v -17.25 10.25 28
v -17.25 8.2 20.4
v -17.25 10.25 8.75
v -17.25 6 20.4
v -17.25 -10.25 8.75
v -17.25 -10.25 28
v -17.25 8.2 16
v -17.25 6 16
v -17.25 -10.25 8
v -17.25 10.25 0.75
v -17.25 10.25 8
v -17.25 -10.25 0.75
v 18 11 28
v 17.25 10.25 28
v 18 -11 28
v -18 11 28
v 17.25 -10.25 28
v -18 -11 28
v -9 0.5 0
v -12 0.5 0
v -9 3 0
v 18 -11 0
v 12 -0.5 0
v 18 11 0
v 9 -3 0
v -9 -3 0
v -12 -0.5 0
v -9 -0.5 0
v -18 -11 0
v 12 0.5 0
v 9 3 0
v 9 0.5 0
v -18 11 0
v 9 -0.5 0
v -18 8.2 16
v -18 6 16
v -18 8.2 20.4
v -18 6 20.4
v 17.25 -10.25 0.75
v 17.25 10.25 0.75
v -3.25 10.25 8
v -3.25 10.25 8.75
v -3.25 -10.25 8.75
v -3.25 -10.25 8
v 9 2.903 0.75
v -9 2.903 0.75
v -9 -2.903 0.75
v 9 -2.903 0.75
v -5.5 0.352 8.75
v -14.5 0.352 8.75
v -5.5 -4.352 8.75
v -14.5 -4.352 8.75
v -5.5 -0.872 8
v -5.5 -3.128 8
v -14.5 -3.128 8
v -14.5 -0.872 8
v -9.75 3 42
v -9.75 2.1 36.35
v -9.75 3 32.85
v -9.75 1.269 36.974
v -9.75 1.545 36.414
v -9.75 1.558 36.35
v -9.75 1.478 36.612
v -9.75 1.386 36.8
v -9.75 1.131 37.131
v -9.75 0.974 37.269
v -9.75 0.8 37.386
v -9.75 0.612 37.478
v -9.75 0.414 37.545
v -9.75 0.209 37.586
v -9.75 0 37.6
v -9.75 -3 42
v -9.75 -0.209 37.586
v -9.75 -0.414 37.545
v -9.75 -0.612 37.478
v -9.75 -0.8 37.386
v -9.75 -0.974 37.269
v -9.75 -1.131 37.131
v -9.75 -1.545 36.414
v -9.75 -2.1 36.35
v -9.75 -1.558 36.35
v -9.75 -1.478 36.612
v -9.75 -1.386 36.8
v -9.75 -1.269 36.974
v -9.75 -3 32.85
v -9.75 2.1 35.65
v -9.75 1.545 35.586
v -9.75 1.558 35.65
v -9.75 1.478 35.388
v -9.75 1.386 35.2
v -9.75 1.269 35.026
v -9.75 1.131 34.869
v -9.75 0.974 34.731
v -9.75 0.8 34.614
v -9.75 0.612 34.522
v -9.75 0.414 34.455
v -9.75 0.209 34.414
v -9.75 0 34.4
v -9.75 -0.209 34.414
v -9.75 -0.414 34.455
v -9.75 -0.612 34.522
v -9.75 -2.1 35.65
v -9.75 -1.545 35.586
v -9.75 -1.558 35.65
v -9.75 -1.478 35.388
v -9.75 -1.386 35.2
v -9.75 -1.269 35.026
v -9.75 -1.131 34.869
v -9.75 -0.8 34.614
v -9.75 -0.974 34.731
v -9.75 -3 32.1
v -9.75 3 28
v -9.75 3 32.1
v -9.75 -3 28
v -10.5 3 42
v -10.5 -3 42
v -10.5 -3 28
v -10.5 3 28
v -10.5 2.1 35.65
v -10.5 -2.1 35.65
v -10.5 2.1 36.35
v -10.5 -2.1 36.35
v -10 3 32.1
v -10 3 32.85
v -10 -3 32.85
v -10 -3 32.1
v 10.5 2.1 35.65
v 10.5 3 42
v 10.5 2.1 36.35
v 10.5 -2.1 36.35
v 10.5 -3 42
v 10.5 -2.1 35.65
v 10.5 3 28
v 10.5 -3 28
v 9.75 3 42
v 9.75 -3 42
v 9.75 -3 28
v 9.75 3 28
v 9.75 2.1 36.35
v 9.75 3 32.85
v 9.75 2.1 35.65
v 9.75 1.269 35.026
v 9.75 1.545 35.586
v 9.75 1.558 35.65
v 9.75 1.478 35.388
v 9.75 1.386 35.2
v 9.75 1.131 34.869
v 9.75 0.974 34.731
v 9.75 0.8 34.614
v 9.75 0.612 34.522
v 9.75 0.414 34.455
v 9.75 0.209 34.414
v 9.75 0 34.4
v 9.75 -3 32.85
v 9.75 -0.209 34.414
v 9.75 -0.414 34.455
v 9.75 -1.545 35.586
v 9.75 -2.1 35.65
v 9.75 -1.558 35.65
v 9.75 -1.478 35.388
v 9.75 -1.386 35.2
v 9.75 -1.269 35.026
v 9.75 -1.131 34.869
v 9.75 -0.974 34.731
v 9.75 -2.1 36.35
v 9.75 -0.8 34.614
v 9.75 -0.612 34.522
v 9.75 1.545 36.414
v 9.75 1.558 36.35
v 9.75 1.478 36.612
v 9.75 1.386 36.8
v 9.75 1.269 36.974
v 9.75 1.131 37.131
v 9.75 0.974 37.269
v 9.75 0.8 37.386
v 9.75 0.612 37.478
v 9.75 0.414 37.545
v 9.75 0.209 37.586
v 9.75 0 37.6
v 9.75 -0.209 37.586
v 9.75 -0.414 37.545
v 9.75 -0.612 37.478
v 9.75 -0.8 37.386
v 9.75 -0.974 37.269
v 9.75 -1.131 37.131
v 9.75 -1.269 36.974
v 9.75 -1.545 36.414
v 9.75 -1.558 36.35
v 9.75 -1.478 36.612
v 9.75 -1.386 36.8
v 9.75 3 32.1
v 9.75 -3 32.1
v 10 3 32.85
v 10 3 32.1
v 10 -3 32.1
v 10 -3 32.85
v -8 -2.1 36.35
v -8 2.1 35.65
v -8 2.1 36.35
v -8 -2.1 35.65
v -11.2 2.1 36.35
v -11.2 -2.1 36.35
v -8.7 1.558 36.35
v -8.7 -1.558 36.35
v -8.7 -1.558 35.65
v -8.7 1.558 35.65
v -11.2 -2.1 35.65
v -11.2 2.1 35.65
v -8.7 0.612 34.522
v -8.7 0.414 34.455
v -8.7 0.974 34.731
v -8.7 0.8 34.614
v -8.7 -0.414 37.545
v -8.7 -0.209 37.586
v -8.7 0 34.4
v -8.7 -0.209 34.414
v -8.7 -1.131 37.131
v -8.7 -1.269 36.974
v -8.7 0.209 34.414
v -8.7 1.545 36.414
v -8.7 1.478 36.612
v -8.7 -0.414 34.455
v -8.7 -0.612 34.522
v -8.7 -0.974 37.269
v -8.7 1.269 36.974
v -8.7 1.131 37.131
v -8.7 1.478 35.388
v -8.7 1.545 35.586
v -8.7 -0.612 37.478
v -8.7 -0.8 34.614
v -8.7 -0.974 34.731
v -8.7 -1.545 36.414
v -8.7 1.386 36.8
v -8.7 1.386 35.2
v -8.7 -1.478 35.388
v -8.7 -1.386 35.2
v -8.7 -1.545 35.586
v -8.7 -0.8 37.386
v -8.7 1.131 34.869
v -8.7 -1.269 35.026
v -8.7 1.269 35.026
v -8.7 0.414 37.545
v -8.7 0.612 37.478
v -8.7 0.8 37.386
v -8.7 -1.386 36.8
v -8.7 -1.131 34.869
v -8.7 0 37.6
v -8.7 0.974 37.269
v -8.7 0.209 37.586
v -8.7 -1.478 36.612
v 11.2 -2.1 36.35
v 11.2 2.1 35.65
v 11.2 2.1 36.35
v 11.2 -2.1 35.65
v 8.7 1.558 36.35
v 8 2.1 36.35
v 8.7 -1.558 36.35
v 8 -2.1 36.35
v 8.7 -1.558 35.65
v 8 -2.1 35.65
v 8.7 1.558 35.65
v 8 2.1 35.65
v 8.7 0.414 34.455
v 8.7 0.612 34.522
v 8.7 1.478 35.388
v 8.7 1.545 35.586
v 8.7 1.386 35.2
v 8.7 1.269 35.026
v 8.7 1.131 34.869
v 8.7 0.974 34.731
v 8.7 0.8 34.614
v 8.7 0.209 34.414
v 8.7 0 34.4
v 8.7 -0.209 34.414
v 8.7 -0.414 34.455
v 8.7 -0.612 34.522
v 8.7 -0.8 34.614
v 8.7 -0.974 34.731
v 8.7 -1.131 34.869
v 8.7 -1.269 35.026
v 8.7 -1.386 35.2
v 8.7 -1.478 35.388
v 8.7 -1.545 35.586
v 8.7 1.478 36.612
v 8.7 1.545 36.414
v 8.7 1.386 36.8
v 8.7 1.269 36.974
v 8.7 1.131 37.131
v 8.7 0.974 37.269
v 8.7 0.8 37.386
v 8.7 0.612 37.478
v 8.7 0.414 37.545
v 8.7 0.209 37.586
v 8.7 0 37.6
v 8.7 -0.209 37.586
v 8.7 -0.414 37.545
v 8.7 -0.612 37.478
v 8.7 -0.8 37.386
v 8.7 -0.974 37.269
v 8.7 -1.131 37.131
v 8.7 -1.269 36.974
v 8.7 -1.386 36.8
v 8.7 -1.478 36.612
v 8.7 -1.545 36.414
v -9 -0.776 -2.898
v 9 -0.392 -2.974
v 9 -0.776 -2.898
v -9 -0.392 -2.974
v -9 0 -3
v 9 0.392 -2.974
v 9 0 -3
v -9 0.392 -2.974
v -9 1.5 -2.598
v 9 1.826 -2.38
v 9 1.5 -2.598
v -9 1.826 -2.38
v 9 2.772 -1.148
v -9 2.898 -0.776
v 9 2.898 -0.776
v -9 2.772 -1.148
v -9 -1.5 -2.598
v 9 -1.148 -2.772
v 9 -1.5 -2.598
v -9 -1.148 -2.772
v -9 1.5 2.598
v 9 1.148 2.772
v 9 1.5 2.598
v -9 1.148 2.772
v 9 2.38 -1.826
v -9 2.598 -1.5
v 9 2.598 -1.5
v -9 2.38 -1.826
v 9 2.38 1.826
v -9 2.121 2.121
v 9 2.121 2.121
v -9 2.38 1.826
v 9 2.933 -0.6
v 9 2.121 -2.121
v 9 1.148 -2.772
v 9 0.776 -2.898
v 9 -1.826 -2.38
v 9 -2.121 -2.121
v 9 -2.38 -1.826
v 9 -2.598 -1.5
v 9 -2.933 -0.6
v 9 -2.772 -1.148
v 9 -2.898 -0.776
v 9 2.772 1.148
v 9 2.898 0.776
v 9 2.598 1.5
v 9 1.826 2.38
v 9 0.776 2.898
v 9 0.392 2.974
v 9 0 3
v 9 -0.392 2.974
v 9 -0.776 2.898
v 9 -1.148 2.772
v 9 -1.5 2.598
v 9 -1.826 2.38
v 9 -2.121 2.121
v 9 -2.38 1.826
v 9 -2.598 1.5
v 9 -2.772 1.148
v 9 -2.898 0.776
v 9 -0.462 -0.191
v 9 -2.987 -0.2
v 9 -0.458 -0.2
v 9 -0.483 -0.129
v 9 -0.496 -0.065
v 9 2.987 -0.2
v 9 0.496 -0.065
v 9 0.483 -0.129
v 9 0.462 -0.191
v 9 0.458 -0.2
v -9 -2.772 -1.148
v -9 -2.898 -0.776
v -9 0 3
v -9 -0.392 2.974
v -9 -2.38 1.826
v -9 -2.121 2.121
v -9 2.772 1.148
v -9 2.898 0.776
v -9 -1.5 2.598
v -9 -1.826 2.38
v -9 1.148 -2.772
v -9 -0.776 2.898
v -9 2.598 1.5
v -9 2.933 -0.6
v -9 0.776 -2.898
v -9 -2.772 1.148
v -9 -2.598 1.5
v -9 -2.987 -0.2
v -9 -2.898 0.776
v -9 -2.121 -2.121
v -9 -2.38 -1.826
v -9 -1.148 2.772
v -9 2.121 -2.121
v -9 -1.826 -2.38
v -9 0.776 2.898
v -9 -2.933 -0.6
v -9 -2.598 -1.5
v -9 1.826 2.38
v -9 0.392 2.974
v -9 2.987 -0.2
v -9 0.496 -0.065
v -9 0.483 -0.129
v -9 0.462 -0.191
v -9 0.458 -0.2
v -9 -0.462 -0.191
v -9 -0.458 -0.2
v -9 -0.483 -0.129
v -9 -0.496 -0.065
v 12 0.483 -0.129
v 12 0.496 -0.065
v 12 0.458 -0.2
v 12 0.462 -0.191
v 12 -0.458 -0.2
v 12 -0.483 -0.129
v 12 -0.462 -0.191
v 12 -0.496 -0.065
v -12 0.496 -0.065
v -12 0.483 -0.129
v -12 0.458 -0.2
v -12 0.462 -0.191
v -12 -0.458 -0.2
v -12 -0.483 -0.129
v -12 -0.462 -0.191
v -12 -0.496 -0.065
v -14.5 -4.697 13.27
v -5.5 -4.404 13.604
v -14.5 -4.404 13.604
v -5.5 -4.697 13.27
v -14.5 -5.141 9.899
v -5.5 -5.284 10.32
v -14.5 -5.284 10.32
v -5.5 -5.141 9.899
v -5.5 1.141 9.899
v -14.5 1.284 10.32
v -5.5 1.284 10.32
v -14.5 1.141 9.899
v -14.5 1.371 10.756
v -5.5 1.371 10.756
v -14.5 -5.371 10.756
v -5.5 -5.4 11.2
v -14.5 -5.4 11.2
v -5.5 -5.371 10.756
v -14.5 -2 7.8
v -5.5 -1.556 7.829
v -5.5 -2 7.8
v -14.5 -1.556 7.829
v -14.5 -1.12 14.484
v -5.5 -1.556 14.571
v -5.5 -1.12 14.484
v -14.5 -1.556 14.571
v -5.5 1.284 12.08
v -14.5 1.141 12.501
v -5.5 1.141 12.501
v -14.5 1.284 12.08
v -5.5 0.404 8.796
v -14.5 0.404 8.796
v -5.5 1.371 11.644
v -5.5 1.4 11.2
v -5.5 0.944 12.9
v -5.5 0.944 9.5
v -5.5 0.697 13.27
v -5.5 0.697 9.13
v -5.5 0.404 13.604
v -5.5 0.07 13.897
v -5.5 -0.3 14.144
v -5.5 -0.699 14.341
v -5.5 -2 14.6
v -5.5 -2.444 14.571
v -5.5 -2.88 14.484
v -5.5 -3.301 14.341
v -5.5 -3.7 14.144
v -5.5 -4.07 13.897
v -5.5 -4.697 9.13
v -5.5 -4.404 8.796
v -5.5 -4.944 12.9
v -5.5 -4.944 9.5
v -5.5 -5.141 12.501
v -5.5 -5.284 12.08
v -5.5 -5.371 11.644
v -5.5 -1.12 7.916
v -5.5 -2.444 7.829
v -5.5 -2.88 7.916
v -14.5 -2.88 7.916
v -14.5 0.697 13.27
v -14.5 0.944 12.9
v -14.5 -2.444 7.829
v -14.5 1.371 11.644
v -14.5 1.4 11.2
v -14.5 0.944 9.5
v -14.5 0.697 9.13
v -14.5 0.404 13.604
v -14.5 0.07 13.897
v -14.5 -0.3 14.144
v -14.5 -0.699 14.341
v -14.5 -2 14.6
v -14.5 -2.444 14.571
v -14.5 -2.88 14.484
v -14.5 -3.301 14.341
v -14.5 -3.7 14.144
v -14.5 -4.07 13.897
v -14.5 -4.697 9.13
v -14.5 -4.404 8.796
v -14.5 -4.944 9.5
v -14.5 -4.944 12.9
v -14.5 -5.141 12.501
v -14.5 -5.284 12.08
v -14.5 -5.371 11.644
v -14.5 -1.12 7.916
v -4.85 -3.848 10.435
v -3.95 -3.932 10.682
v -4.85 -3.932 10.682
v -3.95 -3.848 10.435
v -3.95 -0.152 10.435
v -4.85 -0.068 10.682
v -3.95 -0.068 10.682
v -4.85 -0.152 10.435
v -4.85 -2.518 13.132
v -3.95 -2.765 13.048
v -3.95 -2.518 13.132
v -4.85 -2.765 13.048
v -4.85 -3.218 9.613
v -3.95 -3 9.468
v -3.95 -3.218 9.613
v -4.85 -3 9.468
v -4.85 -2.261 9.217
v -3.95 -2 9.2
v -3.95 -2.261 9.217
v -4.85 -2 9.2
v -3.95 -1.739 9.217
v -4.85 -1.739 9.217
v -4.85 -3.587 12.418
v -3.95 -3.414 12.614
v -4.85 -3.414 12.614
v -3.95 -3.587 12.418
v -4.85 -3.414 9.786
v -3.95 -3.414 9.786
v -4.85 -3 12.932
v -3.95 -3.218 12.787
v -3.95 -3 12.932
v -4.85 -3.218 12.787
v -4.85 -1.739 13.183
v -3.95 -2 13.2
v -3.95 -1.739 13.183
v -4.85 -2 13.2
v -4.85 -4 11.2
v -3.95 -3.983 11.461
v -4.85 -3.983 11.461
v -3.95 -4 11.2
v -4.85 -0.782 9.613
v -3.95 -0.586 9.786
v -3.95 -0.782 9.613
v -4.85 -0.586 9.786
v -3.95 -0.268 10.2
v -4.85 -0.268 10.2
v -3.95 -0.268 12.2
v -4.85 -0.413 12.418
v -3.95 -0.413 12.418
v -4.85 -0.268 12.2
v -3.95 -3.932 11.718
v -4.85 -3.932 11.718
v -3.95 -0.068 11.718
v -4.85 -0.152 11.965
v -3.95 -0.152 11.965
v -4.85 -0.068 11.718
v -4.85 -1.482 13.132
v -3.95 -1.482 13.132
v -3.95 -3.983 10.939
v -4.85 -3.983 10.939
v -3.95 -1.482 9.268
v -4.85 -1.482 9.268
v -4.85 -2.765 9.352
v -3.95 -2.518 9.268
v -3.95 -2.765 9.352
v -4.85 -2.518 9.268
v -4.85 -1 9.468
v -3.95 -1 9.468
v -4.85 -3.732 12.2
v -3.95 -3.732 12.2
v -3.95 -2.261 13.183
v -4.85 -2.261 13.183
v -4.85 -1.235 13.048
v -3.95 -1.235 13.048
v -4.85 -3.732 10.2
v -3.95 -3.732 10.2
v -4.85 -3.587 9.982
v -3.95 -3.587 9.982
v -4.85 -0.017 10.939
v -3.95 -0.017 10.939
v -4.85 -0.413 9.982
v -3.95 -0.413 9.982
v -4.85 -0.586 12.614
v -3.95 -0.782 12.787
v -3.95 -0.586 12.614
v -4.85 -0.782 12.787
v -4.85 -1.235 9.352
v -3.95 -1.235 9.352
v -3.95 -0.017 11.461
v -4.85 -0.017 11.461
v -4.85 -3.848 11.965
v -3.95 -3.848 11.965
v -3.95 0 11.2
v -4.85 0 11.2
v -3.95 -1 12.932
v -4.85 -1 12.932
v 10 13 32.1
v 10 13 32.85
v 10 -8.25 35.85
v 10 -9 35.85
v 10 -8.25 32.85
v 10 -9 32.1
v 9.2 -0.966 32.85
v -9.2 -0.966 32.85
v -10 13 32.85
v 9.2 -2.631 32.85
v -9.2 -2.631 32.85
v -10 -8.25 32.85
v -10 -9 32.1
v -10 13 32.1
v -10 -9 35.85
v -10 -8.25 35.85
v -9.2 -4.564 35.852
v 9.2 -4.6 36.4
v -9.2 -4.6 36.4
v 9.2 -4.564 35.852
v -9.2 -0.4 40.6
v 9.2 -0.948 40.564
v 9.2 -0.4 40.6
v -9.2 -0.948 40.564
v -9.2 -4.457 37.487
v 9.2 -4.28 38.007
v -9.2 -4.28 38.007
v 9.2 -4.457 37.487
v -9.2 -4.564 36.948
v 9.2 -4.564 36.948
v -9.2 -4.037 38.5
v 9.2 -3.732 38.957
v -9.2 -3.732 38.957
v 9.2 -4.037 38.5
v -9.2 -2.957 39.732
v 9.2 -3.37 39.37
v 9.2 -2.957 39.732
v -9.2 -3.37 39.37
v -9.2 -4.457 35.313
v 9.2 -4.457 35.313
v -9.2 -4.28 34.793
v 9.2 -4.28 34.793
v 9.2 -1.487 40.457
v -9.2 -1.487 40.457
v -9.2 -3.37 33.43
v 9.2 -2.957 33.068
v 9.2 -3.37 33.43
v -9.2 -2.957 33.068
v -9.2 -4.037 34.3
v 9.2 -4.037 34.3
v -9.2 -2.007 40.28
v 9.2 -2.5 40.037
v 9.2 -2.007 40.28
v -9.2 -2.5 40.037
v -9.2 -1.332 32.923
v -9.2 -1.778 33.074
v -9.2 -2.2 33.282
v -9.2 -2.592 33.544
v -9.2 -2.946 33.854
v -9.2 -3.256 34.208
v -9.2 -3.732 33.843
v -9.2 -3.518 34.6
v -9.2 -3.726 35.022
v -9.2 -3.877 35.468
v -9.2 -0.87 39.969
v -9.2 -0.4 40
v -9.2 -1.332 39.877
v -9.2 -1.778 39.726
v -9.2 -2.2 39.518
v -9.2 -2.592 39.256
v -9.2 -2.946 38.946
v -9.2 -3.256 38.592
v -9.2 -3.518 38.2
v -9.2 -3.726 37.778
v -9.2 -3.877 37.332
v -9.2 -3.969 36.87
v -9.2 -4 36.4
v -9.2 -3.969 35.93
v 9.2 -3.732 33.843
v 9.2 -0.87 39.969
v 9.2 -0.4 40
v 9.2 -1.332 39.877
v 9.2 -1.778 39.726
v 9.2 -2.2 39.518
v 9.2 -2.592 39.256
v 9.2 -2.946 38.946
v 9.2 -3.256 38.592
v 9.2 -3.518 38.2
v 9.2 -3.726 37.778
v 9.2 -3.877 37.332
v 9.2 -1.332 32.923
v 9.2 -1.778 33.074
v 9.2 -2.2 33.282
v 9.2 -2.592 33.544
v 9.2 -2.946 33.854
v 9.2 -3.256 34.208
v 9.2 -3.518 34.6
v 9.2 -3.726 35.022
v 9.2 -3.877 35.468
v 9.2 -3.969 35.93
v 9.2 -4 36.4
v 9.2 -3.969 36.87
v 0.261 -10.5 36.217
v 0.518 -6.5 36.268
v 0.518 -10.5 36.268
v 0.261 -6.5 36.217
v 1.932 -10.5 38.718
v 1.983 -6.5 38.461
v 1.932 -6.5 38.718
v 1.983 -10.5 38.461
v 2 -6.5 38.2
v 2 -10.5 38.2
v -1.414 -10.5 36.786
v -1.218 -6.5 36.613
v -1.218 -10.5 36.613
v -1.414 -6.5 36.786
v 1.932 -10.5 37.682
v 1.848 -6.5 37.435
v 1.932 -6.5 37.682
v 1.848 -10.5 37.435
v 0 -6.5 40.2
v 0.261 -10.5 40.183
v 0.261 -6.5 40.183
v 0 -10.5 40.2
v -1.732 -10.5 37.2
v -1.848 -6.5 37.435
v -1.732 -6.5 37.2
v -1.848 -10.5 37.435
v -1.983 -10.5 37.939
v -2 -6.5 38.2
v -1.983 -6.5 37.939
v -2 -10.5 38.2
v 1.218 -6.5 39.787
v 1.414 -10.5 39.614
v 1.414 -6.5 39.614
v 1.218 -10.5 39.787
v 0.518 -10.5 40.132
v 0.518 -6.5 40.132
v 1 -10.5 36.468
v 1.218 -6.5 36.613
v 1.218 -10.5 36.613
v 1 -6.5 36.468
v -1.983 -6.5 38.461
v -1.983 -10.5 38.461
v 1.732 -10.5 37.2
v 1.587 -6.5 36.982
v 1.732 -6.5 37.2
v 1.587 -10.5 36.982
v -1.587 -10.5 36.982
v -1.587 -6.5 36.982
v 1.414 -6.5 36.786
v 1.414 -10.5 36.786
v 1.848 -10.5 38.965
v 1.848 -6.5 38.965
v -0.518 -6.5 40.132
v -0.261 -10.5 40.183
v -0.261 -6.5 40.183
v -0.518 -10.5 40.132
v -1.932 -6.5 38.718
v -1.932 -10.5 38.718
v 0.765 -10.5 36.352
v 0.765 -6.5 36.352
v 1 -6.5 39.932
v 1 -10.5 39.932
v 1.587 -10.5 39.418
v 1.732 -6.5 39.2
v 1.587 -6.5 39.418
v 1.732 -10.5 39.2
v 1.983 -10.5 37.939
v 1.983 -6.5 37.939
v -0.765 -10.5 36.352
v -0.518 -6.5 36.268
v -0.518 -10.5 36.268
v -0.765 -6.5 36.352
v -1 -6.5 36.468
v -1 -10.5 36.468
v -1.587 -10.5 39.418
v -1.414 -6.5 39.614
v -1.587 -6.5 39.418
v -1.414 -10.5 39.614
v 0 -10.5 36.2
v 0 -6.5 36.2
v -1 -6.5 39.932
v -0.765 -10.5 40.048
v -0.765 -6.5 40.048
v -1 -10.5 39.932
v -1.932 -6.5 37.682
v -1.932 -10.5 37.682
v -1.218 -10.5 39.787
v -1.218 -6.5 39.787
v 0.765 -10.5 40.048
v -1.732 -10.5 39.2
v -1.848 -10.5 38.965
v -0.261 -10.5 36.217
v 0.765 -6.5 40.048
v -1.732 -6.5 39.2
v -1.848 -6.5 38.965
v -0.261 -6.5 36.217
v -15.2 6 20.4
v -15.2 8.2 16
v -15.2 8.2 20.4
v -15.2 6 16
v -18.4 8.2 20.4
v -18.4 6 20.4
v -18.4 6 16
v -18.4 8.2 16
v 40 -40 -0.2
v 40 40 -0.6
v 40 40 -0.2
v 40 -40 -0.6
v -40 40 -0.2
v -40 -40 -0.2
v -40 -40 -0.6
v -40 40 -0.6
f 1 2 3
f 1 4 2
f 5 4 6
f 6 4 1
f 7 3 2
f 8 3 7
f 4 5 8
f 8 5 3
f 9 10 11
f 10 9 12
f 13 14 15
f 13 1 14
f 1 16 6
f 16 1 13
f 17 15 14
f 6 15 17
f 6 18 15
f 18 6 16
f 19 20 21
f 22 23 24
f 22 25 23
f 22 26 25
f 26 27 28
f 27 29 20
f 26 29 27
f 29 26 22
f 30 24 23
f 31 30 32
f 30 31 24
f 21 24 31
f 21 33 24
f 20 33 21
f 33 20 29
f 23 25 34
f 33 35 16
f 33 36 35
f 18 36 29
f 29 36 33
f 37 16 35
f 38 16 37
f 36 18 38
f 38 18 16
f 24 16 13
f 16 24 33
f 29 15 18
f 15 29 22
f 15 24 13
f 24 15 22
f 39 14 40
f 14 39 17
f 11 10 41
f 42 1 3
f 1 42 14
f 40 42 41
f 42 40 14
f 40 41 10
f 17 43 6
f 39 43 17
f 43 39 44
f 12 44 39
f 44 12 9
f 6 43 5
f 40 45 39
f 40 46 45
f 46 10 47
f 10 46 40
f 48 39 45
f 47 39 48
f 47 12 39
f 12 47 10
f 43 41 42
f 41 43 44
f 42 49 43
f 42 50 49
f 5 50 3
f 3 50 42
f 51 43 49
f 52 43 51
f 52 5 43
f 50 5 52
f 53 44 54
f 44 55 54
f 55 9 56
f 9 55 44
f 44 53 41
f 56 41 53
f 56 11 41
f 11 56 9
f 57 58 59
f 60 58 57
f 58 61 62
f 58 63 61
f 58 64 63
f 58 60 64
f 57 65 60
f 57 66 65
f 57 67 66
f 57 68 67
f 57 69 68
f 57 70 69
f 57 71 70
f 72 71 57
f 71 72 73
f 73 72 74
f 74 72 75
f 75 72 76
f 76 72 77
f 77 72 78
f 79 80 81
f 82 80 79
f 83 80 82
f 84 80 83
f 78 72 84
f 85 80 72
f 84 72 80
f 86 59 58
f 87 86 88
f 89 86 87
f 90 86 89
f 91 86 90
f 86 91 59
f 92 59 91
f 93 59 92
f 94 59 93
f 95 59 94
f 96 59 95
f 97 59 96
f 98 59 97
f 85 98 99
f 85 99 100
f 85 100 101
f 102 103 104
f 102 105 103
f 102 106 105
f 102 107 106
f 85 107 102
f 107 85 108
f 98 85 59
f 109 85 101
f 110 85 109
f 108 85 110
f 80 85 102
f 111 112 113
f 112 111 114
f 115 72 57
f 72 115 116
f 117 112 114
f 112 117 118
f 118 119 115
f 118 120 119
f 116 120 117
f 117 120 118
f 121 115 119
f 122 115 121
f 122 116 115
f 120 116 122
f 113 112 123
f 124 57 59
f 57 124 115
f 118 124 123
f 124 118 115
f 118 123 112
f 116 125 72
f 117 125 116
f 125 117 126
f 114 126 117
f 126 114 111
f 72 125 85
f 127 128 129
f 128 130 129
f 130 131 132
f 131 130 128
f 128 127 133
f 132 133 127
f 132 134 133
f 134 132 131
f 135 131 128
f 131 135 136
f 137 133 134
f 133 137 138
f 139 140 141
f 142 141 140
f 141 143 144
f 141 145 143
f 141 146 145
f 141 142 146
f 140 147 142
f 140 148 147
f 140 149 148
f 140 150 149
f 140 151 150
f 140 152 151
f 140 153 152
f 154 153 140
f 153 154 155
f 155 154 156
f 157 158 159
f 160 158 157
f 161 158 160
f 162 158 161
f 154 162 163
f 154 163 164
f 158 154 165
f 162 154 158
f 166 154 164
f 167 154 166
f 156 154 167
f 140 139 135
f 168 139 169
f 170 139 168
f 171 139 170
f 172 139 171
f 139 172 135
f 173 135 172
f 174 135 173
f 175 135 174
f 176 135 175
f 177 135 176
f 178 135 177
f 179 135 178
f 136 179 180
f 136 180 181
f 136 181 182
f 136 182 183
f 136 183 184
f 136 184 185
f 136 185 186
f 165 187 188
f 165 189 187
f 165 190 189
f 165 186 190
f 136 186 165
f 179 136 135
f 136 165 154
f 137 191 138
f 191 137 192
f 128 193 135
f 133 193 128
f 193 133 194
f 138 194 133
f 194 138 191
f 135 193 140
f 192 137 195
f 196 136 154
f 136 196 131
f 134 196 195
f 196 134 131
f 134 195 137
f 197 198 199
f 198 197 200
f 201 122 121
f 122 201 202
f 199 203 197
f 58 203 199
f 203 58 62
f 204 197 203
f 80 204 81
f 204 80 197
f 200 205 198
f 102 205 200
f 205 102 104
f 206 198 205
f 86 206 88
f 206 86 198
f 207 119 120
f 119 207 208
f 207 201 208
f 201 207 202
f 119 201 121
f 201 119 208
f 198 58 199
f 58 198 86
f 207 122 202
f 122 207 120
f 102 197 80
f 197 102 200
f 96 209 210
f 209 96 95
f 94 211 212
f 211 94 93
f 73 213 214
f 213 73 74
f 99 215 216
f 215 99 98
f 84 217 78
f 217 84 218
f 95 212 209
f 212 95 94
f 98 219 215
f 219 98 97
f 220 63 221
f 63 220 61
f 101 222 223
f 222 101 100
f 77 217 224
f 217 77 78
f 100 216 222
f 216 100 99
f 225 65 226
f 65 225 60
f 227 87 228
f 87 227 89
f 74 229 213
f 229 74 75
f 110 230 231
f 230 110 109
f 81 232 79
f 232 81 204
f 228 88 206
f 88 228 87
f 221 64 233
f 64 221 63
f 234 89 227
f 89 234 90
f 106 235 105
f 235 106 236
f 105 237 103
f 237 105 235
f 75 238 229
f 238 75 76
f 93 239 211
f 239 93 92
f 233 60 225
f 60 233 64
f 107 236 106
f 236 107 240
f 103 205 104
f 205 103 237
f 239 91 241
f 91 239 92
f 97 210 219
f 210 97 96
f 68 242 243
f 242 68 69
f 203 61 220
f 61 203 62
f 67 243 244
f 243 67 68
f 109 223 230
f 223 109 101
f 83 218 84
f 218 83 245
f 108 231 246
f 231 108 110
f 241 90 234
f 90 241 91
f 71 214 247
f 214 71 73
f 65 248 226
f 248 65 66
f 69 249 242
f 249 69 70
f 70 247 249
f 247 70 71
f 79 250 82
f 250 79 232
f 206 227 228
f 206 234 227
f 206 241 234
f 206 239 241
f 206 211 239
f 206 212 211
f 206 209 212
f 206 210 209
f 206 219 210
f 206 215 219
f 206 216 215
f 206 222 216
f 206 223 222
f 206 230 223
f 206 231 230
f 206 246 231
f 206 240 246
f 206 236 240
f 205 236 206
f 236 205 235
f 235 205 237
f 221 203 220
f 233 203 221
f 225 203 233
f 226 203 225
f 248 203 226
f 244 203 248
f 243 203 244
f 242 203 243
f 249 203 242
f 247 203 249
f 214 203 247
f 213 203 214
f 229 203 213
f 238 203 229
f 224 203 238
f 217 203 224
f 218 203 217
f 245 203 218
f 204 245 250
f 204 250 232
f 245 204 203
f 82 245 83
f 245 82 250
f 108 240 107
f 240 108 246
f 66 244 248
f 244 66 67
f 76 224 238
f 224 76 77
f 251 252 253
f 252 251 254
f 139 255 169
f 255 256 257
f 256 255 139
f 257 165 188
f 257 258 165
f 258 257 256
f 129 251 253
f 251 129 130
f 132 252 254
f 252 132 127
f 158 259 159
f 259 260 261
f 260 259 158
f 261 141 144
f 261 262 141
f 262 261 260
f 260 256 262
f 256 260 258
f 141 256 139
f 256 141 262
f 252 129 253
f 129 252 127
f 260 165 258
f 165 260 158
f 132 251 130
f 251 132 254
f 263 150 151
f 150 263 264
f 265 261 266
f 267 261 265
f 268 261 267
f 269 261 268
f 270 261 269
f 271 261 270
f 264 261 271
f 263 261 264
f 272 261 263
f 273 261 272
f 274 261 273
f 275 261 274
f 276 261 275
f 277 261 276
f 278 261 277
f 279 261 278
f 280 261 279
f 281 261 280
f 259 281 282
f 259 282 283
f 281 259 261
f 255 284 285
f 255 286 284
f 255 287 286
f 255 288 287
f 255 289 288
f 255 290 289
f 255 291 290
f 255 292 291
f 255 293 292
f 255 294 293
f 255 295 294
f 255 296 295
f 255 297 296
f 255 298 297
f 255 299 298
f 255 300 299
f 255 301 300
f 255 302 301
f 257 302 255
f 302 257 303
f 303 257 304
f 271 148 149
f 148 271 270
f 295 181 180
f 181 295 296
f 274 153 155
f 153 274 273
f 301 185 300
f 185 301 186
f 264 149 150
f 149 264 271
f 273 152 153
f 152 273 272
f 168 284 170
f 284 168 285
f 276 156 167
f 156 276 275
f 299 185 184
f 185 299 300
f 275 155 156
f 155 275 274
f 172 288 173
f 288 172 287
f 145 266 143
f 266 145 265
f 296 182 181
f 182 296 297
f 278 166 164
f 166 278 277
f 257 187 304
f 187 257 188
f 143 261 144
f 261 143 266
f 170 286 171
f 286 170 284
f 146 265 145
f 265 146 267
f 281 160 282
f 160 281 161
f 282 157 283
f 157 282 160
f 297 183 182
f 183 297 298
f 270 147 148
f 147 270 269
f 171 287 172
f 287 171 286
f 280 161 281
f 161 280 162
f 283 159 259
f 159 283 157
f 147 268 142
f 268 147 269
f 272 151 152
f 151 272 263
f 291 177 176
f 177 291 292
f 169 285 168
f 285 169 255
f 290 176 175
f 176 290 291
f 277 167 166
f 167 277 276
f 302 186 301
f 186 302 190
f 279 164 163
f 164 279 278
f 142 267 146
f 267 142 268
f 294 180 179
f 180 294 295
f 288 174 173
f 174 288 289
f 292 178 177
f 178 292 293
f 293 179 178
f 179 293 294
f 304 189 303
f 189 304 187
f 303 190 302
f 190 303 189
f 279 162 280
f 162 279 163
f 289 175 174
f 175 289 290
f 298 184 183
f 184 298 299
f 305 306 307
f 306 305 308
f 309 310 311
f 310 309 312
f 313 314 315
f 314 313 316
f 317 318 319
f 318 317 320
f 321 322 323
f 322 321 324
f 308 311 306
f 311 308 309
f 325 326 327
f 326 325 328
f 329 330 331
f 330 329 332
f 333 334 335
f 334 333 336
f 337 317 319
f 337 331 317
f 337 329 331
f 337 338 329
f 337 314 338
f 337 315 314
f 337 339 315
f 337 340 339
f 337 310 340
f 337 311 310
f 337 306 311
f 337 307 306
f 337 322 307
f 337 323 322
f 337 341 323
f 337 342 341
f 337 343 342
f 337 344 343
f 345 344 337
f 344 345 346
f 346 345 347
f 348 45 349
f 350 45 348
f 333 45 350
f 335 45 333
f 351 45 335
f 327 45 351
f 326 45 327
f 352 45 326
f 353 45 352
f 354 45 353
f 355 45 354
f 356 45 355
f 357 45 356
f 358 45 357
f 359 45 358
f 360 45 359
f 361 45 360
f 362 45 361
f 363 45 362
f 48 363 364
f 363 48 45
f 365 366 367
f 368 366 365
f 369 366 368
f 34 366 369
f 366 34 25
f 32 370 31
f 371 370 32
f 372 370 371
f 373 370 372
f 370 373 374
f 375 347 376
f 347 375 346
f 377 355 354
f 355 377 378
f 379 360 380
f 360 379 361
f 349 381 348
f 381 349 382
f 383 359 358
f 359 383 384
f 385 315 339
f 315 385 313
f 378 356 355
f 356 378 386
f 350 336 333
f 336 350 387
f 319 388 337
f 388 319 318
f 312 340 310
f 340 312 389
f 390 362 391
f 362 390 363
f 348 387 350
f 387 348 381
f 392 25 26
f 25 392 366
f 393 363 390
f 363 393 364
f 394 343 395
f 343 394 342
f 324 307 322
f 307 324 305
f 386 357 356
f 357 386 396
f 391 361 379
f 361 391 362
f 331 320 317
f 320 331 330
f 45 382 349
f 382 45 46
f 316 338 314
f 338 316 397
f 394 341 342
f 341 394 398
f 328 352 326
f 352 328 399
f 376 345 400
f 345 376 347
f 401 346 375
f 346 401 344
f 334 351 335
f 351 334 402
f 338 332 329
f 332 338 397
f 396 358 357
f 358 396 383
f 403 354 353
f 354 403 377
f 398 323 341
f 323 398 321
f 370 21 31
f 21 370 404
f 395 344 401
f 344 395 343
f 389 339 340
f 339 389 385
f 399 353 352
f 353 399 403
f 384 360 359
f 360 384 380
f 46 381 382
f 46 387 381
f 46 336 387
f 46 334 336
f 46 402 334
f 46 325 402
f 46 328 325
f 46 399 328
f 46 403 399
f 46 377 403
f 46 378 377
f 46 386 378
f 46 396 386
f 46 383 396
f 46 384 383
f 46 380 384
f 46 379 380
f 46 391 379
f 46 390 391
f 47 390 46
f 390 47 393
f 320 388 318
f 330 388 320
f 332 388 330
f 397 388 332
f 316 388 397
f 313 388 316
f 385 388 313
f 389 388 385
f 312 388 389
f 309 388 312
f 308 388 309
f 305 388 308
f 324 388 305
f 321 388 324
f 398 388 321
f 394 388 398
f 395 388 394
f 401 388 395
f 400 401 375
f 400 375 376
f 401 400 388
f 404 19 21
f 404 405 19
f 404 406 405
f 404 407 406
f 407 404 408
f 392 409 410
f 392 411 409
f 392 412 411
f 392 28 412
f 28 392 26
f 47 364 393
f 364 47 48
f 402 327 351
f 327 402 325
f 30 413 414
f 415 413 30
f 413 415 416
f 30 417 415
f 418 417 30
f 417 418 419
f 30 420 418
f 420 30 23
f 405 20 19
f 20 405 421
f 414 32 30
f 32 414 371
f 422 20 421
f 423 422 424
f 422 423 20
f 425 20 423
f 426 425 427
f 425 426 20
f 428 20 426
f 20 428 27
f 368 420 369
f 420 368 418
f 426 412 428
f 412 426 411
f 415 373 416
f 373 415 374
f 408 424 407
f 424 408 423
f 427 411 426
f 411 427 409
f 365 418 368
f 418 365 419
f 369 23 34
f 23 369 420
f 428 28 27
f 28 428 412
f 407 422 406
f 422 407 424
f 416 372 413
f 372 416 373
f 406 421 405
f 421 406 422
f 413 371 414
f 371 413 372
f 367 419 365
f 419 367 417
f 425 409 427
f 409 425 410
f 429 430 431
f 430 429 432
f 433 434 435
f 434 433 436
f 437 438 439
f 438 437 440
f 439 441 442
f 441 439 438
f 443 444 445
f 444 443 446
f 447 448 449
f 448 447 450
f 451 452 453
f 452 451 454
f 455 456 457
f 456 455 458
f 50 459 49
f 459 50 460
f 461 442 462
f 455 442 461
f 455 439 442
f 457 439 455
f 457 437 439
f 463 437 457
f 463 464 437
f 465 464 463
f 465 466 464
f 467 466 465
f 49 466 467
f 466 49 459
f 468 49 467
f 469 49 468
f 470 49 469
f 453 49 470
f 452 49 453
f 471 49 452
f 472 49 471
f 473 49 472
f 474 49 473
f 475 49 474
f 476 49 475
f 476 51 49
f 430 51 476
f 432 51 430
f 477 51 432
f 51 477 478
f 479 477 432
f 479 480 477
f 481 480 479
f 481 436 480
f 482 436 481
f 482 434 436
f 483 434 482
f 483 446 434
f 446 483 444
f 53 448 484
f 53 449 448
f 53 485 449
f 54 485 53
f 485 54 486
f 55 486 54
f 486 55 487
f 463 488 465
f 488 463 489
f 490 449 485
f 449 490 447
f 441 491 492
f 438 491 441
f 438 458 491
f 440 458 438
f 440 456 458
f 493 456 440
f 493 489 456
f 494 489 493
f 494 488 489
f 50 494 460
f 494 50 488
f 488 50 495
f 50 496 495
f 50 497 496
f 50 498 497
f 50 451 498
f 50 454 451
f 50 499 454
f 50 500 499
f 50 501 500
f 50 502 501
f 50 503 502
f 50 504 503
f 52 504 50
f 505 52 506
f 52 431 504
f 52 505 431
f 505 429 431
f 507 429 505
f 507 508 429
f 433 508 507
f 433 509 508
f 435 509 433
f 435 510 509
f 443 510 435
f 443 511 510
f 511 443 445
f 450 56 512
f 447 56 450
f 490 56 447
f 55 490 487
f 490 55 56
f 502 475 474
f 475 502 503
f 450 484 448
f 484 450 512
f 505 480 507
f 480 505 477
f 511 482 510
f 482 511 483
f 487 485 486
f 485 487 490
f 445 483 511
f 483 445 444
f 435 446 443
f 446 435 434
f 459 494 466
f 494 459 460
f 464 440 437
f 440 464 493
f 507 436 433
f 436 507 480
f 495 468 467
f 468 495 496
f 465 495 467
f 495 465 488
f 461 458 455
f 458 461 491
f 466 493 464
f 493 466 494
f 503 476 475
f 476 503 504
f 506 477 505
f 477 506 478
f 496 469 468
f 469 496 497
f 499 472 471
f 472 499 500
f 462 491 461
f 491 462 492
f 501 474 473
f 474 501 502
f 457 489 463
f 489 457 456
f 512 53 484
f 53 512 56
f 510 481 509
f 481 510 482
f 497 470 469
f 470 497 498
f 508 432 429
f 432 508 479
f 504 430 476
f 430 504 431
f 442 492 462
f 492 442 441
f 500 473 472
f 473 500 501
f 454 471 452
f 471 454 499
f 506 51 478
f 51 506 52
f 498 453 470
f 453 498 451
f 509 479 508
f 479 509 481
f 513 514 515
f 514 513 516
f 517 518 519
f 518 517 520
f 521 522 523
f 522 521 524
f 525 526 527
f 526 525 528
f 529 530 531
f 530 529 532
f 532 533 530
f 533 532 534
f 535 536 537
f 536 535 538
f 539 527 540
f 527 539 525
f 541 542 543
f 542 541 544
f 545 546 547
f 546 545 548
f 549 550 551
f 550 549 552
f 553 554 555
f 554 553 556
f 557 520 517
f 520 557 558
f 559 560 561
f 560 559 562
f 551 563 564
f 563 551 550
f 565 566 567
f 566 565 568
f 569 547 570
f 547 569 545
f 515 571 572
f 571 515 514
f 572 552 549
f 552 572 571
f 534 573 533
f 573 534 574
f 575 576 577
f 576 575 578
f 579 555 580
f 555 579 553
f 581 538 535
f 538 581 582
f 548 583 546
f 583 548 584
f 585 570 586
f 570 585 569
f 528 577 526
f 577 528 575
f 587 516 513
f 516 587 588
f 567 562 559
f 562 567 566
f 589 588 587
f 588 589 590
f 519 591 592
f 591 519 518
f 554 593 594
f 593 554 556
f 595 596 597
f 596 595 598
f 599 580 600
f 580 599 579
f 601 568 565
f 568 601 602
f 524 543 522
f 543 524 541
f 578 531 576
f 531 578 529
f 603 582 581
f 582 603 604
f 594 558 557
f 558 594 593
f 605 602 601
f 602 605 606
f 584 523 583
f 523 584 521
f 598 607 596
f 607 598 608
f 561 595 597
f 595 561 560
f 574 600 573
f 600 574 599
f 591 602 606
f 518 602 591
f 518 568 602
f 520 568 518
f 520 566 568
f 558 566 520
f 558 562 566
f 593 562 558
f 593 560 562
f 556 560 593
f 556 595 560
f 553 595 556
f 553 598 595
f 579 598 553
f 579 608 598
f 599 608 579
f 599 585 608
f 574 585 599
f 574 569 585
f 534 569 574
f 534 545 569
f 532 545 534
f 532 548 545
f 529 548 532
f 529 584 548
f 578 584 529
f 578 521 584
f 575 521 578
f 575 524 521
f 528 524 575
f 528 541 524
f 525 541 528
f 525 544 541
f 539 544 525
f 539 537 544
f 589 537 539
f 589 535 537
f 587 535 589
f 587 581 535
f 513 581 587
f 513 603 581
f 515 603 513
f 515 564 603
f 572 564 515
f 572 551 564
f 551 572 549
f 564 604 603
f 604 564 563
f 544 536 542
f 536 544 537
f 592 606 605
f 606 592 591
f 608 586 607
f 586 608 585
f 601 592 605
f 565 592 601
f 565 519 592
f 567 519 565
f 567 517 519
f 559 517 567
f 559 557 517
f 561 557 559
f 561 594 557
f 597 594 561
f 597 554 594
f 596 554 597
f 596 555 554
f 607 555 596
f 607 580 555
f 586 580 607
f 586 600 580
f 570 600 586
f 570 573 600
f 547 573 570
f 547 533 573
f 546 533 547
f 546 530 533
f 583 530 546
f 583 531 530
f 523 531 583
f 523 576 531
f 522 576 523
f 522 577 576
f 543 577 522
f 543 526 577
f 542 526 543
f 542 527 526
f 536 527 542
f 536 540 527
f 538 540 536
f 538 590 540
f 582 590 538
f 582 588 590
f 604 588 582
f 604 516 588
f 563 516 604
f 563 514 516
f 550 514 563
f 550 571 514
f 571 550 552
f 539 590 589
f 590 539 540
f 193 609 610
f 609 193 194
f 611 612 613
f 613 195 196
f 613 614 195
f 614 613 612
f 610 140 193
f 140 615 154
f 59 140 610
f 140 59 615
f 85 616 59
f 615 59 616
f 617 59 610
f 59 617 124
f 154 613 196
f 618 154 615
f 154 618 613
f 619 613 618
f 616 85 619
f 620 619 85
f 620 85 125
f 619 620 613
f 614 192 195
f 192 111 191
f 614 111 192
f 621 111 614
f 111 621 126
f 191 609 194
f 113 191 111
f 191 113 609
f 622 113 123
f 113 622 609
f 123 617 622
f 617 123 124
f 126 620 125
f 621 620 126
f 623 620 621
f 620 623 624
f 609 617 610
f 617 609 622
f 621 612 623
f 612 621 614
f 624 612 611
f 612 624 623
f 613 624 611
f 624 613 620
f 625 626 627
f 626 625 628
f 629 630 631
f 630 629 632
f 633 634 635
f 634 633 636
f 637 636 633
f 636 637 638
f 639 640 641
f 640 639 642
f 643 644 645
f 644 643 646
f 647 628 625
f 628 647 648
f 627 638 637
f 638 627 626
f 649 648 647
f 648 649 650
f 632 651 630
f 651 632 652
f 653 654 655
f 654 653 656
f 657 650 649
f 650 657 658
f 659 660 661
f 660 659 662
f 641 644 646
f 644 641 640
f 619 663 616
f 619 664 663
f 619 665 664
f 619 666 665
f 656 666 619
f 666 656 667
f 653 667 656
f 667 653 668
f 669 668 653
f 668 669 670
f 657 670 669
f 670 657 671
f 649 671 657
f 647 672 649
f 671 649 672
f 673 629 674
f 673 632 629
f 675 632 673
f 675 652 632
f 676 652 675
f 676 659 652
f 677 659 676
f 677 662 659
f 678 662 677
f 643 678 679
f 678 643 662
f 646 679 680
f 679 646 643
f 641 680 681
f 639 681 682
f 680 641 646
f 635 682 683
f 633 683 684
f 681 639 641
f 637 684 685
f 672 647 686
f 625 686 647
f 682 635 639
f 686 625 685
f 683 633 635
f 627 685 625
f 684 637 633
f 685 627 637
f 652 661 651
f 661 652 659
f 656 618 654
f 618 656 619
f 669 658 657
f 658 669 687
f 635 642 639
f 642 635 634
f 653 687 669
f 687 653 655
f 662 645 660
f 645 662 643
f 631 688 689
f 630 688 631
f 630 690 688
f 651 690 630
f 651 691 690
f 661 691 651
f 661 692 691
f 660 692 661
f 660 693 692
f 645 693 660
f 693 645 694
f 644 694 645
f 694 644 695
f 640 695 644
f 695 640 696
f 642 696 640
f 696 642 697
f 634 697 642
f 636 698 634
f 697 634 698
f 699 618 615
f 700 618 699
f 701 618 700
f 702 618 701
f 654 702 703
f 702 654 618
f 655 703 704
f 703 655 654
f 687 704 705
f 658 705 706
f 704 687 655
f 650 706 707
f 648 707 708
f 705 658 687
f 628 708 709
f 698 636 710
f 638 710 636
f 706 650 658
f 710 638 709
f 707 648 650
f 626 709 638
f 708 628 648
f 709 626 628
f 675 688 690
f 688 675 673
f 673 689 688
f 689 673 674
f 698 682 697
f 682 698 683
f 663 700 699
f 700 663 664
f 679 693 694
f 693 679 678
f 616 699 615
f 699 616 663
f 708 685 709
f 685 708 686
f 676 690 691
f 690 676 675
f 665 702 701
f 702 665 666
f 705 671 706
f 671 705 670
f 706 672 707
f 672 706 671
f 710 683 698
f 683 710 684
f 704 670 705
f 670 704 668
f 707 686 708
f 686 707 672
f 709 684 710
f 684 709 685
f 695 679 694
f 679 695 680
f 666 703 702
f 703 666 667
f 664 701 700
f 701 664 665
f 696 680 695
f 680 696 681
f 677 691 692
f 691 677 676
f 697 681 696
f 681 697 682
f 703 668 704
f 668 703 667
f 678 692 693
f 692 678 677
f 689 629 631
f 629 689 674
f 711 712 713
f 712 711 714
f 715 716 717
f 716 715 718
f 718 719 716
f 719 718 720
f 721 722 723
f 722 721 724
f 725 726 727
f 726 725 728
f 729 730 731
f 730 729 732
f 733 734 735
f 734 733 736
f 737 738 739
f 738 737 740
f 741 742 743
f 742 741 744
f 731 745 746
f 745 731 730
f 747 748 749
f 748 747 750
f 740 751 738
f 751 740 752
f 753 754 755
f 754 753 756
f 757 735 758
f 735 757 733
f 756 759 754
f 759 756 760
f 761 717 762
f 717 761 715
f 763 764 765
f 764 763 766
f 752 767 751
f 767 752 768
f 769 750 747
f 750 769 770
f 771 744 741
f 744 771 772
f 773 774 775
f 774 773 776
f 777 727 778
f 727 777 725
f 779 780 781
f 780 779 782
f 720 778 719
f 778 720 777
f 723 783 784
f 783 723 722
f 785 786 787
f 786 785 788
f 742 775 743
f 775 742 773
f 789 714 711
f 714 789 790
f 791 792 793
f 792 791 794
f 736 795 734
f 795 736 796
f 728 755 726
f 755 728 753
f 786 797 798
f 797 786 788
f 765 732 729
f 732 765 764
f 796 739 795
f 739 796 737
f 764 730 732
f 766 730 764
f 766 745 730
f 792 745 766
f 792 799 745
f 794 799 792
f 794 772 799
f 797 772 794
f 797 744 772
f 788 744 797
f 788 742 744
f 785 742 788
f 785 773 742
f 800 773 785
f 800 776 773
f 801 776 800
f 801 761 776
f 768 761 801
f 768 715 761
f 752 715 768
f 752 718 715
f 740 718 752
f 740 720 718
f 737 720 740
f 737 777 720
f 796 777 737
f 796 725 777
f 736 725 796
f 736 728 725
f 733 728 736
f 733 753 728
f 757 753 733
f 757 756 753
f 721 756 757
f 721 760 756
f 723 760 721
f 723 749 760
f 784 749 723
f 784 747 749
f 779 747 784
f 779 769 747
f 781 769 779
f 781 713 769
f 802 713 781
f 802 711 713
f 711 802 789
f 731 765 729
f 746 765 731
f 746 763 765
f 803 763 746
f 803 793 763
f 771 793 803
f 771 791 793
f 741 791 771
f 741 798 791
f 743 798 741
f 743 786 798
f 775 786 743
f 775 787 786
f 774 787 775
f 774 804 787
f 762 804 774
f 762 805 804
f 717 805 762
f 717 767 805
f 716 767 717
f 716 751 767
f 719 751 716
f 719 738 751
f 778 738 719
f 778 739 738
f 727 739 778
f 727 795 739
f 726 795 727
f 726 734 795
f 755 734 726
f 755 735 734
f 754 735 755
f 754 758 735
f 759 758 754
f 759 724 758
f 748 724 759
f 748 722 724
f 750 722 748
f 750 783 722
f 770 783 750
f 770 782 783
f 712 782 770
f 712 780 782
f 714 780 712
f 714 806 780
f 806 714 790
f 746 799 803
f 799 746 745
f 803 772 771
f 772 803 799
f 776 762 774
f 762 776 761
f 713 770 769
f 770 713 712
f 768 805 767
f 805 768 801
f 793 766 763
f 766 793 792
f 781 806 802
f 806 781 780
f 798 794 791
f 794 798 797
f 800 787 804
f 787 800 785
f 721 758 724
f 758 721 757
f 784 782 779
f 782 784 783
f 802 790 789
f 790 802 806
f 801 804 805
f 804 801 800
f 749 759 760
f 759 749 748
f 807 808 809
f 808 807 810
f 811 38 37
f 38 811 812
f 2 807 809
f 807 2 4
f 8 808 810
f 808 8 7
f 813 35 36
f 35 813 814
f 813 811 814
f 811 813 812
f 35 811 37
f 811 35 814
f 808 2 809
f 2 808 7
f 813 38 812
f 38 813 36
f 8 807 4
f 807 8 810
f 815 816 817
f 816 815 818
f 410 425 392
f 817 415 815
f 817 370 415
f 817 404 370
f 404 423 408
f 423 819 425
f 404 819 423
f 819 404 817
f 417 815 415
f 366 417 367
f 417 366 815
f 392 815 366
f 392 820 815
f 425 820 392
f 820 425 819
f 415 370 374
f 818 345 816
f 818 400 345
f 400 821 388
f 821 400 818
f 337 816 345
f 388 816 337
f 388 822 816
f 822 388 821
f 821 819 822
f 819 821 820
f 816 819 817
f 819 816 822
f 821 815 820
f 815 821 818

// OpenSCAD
// DS-18 shop drum sander — parametric OpenSCAD (inches)
// Usage: openscad -o ds18.png --imgsize=1600,1000 --autocenter --viewall drum_sander.scad
// Units: inches. Convert at $fn for preview.

$fn = 48;
inch = 1;

cab_w = 36;
cab_d = 22;
cab_h = 28;
ply = 0.75;
drum_od = 6;
drum_len = 18;
shaft_od = 1;
shaft_len = 24;
table_w = 20;
table_d = 22;
table_lift = 0.9; // gap under drum
explode = 0;      // 0 assembled, 8–16 exploded

c_ply   = [0.77, 0.65, 0.45];
c_ply2  = [0.69, 0.54, 0.34];
c_sand  = [0.83, 0.65, 0.45];
c_steel = [0.54, 0.56, 0.59];
c_dark  = [0.16, 0.18, 0.20];
c_hood  = [0.29, 0.33, 0.38];
c_sw    = [0.77, 0.48, 0.23];

module ply_box(w, h, d) cube([w, d, h]);

module cabinet() {
  color(c_ply) {
    // left / right
    translate([-cab_w/2, -cab_d/2, 0]) cube([ply, cab_d, cab_h]);
    translate([cab_w/2 - ply, -cab_d/2, 0]) cube([ply, cab_d, cab_h]);
    // front / back
    translate([-cab_w/2 + ply, cab_d/2 - ply, 0]) cube([cab_w - 2*ply, ply, cab_h]);
    translate([-cab_w/2 + ply, -cab_d/2, 0]) cube([cab_w - 2*ply, ply, cab_h]);
    // bottom
    translate([-cab_w/2 + ply, -cab_d/2 + ply, 0]) cube([cab_w - 2*ply, cab_d - 2*ply, ply]);
    // motor shelf
    translate([-cab_w/2 + ply, -cab_d/2 + ply, 8]) cube([14, cab_d - 2*ply, ply]);
  }
}

module towers() {
  color(c_ply2) {
    translate([-10.5, -3, cab_h]) cube([ply, 6, 14]);
    translate([10.5 - ply, -3, cab_h]) cube([ply, 6, 14]);
  }
}

module drum_assy() {
  z = cab_h + 8;
  translate([0, 0, explode * 1.2]) {
    color(c_sand)
      rotate([0, 90, 0])
        translate([0, 0, -drum_len/2])
          cylinder(h=drum_len, d=drum_od);
    color(c_steel)
      rotate([0, 90, 0])
        translate([0, 0, -shaft_len/2])
          cylinder(h=shaft_len, d=shaft_od);
    color(c_steel) {
      translate([-9.6, 0, z - (cab_h + 8)]) pillow();
      translate([9.6, 0, z - (cab_h + 8)]) pillow();
    }
  }
}

module pillow() {
  translate([0, 0, cab_h + 8]) {
    cube([3.2, 4.2, 0.7], center=true);
    rotate([0, 90, 0]) cylinder(h=1.8, d=3.2, center=true);
  }
}

module motor() {
  translate([-explode * 1.4, -explode * 0.6, 0]) {
    color(c_dark)
      translate([-10, -2, 11.2])
        rotate([0, 90, 0]) cylinder(h=9, d=6.8, center=true);
    color(c_steel)
      translate([-4.4, -2, 11.2])
        rotate([0, 90, 0]) cylinder(h=0.9, d=4, center=true);
  }
}

module table() {
  z = cab_h + 8 - drum_od/2 - table_lift;
  translate([0, explode * 0.8, -explode * 0.6]) {
    color(c_ply)
      translate([-table_w/2, -table_d/2 + 2, z])
        cube([table_w, table_d, ply]);
    color([0.55, 0.35, 0.17])
      translate([-table_w/2, -table_d/2 + 2, z + ply])
        cube([table_w, 0.75, 3]);
  }
}

module hood() {
  translate([0, 0, explode * 1.4]) color(c_hood) {
    translate([0, -0.4, cab_h + 8.4])
      rotate([0, 90, 0])
        difference() {
          cylinder(h=18.4, d=8.4, center=true);
          cylinder(h=19, d=7.2, center=true);
          translate([-6, 0, -10]) cube([12, 12, 20]);
        }
    translate([0, -6.5, cab_h + 10.2])
      rotate([90, 0, 0]) cylinder(h=4, d=4);
  }
}

module switch() {
  color(c_sw)
    translate([-cab_w/2 - 0.4 - explode, cab_d/2 - 5, 16])
      cube([3.2, 2.2, 4.4]);
}

translate([0, 0, -explode]) cabinet();
towers();
drum_assy();
motor();
table();
hood();
switch();

// shop floor
color([0.16, 0.14, 0.11])
  translate([0, 0, -0.4])
    cube([80, 80, 0.4], center=true);
